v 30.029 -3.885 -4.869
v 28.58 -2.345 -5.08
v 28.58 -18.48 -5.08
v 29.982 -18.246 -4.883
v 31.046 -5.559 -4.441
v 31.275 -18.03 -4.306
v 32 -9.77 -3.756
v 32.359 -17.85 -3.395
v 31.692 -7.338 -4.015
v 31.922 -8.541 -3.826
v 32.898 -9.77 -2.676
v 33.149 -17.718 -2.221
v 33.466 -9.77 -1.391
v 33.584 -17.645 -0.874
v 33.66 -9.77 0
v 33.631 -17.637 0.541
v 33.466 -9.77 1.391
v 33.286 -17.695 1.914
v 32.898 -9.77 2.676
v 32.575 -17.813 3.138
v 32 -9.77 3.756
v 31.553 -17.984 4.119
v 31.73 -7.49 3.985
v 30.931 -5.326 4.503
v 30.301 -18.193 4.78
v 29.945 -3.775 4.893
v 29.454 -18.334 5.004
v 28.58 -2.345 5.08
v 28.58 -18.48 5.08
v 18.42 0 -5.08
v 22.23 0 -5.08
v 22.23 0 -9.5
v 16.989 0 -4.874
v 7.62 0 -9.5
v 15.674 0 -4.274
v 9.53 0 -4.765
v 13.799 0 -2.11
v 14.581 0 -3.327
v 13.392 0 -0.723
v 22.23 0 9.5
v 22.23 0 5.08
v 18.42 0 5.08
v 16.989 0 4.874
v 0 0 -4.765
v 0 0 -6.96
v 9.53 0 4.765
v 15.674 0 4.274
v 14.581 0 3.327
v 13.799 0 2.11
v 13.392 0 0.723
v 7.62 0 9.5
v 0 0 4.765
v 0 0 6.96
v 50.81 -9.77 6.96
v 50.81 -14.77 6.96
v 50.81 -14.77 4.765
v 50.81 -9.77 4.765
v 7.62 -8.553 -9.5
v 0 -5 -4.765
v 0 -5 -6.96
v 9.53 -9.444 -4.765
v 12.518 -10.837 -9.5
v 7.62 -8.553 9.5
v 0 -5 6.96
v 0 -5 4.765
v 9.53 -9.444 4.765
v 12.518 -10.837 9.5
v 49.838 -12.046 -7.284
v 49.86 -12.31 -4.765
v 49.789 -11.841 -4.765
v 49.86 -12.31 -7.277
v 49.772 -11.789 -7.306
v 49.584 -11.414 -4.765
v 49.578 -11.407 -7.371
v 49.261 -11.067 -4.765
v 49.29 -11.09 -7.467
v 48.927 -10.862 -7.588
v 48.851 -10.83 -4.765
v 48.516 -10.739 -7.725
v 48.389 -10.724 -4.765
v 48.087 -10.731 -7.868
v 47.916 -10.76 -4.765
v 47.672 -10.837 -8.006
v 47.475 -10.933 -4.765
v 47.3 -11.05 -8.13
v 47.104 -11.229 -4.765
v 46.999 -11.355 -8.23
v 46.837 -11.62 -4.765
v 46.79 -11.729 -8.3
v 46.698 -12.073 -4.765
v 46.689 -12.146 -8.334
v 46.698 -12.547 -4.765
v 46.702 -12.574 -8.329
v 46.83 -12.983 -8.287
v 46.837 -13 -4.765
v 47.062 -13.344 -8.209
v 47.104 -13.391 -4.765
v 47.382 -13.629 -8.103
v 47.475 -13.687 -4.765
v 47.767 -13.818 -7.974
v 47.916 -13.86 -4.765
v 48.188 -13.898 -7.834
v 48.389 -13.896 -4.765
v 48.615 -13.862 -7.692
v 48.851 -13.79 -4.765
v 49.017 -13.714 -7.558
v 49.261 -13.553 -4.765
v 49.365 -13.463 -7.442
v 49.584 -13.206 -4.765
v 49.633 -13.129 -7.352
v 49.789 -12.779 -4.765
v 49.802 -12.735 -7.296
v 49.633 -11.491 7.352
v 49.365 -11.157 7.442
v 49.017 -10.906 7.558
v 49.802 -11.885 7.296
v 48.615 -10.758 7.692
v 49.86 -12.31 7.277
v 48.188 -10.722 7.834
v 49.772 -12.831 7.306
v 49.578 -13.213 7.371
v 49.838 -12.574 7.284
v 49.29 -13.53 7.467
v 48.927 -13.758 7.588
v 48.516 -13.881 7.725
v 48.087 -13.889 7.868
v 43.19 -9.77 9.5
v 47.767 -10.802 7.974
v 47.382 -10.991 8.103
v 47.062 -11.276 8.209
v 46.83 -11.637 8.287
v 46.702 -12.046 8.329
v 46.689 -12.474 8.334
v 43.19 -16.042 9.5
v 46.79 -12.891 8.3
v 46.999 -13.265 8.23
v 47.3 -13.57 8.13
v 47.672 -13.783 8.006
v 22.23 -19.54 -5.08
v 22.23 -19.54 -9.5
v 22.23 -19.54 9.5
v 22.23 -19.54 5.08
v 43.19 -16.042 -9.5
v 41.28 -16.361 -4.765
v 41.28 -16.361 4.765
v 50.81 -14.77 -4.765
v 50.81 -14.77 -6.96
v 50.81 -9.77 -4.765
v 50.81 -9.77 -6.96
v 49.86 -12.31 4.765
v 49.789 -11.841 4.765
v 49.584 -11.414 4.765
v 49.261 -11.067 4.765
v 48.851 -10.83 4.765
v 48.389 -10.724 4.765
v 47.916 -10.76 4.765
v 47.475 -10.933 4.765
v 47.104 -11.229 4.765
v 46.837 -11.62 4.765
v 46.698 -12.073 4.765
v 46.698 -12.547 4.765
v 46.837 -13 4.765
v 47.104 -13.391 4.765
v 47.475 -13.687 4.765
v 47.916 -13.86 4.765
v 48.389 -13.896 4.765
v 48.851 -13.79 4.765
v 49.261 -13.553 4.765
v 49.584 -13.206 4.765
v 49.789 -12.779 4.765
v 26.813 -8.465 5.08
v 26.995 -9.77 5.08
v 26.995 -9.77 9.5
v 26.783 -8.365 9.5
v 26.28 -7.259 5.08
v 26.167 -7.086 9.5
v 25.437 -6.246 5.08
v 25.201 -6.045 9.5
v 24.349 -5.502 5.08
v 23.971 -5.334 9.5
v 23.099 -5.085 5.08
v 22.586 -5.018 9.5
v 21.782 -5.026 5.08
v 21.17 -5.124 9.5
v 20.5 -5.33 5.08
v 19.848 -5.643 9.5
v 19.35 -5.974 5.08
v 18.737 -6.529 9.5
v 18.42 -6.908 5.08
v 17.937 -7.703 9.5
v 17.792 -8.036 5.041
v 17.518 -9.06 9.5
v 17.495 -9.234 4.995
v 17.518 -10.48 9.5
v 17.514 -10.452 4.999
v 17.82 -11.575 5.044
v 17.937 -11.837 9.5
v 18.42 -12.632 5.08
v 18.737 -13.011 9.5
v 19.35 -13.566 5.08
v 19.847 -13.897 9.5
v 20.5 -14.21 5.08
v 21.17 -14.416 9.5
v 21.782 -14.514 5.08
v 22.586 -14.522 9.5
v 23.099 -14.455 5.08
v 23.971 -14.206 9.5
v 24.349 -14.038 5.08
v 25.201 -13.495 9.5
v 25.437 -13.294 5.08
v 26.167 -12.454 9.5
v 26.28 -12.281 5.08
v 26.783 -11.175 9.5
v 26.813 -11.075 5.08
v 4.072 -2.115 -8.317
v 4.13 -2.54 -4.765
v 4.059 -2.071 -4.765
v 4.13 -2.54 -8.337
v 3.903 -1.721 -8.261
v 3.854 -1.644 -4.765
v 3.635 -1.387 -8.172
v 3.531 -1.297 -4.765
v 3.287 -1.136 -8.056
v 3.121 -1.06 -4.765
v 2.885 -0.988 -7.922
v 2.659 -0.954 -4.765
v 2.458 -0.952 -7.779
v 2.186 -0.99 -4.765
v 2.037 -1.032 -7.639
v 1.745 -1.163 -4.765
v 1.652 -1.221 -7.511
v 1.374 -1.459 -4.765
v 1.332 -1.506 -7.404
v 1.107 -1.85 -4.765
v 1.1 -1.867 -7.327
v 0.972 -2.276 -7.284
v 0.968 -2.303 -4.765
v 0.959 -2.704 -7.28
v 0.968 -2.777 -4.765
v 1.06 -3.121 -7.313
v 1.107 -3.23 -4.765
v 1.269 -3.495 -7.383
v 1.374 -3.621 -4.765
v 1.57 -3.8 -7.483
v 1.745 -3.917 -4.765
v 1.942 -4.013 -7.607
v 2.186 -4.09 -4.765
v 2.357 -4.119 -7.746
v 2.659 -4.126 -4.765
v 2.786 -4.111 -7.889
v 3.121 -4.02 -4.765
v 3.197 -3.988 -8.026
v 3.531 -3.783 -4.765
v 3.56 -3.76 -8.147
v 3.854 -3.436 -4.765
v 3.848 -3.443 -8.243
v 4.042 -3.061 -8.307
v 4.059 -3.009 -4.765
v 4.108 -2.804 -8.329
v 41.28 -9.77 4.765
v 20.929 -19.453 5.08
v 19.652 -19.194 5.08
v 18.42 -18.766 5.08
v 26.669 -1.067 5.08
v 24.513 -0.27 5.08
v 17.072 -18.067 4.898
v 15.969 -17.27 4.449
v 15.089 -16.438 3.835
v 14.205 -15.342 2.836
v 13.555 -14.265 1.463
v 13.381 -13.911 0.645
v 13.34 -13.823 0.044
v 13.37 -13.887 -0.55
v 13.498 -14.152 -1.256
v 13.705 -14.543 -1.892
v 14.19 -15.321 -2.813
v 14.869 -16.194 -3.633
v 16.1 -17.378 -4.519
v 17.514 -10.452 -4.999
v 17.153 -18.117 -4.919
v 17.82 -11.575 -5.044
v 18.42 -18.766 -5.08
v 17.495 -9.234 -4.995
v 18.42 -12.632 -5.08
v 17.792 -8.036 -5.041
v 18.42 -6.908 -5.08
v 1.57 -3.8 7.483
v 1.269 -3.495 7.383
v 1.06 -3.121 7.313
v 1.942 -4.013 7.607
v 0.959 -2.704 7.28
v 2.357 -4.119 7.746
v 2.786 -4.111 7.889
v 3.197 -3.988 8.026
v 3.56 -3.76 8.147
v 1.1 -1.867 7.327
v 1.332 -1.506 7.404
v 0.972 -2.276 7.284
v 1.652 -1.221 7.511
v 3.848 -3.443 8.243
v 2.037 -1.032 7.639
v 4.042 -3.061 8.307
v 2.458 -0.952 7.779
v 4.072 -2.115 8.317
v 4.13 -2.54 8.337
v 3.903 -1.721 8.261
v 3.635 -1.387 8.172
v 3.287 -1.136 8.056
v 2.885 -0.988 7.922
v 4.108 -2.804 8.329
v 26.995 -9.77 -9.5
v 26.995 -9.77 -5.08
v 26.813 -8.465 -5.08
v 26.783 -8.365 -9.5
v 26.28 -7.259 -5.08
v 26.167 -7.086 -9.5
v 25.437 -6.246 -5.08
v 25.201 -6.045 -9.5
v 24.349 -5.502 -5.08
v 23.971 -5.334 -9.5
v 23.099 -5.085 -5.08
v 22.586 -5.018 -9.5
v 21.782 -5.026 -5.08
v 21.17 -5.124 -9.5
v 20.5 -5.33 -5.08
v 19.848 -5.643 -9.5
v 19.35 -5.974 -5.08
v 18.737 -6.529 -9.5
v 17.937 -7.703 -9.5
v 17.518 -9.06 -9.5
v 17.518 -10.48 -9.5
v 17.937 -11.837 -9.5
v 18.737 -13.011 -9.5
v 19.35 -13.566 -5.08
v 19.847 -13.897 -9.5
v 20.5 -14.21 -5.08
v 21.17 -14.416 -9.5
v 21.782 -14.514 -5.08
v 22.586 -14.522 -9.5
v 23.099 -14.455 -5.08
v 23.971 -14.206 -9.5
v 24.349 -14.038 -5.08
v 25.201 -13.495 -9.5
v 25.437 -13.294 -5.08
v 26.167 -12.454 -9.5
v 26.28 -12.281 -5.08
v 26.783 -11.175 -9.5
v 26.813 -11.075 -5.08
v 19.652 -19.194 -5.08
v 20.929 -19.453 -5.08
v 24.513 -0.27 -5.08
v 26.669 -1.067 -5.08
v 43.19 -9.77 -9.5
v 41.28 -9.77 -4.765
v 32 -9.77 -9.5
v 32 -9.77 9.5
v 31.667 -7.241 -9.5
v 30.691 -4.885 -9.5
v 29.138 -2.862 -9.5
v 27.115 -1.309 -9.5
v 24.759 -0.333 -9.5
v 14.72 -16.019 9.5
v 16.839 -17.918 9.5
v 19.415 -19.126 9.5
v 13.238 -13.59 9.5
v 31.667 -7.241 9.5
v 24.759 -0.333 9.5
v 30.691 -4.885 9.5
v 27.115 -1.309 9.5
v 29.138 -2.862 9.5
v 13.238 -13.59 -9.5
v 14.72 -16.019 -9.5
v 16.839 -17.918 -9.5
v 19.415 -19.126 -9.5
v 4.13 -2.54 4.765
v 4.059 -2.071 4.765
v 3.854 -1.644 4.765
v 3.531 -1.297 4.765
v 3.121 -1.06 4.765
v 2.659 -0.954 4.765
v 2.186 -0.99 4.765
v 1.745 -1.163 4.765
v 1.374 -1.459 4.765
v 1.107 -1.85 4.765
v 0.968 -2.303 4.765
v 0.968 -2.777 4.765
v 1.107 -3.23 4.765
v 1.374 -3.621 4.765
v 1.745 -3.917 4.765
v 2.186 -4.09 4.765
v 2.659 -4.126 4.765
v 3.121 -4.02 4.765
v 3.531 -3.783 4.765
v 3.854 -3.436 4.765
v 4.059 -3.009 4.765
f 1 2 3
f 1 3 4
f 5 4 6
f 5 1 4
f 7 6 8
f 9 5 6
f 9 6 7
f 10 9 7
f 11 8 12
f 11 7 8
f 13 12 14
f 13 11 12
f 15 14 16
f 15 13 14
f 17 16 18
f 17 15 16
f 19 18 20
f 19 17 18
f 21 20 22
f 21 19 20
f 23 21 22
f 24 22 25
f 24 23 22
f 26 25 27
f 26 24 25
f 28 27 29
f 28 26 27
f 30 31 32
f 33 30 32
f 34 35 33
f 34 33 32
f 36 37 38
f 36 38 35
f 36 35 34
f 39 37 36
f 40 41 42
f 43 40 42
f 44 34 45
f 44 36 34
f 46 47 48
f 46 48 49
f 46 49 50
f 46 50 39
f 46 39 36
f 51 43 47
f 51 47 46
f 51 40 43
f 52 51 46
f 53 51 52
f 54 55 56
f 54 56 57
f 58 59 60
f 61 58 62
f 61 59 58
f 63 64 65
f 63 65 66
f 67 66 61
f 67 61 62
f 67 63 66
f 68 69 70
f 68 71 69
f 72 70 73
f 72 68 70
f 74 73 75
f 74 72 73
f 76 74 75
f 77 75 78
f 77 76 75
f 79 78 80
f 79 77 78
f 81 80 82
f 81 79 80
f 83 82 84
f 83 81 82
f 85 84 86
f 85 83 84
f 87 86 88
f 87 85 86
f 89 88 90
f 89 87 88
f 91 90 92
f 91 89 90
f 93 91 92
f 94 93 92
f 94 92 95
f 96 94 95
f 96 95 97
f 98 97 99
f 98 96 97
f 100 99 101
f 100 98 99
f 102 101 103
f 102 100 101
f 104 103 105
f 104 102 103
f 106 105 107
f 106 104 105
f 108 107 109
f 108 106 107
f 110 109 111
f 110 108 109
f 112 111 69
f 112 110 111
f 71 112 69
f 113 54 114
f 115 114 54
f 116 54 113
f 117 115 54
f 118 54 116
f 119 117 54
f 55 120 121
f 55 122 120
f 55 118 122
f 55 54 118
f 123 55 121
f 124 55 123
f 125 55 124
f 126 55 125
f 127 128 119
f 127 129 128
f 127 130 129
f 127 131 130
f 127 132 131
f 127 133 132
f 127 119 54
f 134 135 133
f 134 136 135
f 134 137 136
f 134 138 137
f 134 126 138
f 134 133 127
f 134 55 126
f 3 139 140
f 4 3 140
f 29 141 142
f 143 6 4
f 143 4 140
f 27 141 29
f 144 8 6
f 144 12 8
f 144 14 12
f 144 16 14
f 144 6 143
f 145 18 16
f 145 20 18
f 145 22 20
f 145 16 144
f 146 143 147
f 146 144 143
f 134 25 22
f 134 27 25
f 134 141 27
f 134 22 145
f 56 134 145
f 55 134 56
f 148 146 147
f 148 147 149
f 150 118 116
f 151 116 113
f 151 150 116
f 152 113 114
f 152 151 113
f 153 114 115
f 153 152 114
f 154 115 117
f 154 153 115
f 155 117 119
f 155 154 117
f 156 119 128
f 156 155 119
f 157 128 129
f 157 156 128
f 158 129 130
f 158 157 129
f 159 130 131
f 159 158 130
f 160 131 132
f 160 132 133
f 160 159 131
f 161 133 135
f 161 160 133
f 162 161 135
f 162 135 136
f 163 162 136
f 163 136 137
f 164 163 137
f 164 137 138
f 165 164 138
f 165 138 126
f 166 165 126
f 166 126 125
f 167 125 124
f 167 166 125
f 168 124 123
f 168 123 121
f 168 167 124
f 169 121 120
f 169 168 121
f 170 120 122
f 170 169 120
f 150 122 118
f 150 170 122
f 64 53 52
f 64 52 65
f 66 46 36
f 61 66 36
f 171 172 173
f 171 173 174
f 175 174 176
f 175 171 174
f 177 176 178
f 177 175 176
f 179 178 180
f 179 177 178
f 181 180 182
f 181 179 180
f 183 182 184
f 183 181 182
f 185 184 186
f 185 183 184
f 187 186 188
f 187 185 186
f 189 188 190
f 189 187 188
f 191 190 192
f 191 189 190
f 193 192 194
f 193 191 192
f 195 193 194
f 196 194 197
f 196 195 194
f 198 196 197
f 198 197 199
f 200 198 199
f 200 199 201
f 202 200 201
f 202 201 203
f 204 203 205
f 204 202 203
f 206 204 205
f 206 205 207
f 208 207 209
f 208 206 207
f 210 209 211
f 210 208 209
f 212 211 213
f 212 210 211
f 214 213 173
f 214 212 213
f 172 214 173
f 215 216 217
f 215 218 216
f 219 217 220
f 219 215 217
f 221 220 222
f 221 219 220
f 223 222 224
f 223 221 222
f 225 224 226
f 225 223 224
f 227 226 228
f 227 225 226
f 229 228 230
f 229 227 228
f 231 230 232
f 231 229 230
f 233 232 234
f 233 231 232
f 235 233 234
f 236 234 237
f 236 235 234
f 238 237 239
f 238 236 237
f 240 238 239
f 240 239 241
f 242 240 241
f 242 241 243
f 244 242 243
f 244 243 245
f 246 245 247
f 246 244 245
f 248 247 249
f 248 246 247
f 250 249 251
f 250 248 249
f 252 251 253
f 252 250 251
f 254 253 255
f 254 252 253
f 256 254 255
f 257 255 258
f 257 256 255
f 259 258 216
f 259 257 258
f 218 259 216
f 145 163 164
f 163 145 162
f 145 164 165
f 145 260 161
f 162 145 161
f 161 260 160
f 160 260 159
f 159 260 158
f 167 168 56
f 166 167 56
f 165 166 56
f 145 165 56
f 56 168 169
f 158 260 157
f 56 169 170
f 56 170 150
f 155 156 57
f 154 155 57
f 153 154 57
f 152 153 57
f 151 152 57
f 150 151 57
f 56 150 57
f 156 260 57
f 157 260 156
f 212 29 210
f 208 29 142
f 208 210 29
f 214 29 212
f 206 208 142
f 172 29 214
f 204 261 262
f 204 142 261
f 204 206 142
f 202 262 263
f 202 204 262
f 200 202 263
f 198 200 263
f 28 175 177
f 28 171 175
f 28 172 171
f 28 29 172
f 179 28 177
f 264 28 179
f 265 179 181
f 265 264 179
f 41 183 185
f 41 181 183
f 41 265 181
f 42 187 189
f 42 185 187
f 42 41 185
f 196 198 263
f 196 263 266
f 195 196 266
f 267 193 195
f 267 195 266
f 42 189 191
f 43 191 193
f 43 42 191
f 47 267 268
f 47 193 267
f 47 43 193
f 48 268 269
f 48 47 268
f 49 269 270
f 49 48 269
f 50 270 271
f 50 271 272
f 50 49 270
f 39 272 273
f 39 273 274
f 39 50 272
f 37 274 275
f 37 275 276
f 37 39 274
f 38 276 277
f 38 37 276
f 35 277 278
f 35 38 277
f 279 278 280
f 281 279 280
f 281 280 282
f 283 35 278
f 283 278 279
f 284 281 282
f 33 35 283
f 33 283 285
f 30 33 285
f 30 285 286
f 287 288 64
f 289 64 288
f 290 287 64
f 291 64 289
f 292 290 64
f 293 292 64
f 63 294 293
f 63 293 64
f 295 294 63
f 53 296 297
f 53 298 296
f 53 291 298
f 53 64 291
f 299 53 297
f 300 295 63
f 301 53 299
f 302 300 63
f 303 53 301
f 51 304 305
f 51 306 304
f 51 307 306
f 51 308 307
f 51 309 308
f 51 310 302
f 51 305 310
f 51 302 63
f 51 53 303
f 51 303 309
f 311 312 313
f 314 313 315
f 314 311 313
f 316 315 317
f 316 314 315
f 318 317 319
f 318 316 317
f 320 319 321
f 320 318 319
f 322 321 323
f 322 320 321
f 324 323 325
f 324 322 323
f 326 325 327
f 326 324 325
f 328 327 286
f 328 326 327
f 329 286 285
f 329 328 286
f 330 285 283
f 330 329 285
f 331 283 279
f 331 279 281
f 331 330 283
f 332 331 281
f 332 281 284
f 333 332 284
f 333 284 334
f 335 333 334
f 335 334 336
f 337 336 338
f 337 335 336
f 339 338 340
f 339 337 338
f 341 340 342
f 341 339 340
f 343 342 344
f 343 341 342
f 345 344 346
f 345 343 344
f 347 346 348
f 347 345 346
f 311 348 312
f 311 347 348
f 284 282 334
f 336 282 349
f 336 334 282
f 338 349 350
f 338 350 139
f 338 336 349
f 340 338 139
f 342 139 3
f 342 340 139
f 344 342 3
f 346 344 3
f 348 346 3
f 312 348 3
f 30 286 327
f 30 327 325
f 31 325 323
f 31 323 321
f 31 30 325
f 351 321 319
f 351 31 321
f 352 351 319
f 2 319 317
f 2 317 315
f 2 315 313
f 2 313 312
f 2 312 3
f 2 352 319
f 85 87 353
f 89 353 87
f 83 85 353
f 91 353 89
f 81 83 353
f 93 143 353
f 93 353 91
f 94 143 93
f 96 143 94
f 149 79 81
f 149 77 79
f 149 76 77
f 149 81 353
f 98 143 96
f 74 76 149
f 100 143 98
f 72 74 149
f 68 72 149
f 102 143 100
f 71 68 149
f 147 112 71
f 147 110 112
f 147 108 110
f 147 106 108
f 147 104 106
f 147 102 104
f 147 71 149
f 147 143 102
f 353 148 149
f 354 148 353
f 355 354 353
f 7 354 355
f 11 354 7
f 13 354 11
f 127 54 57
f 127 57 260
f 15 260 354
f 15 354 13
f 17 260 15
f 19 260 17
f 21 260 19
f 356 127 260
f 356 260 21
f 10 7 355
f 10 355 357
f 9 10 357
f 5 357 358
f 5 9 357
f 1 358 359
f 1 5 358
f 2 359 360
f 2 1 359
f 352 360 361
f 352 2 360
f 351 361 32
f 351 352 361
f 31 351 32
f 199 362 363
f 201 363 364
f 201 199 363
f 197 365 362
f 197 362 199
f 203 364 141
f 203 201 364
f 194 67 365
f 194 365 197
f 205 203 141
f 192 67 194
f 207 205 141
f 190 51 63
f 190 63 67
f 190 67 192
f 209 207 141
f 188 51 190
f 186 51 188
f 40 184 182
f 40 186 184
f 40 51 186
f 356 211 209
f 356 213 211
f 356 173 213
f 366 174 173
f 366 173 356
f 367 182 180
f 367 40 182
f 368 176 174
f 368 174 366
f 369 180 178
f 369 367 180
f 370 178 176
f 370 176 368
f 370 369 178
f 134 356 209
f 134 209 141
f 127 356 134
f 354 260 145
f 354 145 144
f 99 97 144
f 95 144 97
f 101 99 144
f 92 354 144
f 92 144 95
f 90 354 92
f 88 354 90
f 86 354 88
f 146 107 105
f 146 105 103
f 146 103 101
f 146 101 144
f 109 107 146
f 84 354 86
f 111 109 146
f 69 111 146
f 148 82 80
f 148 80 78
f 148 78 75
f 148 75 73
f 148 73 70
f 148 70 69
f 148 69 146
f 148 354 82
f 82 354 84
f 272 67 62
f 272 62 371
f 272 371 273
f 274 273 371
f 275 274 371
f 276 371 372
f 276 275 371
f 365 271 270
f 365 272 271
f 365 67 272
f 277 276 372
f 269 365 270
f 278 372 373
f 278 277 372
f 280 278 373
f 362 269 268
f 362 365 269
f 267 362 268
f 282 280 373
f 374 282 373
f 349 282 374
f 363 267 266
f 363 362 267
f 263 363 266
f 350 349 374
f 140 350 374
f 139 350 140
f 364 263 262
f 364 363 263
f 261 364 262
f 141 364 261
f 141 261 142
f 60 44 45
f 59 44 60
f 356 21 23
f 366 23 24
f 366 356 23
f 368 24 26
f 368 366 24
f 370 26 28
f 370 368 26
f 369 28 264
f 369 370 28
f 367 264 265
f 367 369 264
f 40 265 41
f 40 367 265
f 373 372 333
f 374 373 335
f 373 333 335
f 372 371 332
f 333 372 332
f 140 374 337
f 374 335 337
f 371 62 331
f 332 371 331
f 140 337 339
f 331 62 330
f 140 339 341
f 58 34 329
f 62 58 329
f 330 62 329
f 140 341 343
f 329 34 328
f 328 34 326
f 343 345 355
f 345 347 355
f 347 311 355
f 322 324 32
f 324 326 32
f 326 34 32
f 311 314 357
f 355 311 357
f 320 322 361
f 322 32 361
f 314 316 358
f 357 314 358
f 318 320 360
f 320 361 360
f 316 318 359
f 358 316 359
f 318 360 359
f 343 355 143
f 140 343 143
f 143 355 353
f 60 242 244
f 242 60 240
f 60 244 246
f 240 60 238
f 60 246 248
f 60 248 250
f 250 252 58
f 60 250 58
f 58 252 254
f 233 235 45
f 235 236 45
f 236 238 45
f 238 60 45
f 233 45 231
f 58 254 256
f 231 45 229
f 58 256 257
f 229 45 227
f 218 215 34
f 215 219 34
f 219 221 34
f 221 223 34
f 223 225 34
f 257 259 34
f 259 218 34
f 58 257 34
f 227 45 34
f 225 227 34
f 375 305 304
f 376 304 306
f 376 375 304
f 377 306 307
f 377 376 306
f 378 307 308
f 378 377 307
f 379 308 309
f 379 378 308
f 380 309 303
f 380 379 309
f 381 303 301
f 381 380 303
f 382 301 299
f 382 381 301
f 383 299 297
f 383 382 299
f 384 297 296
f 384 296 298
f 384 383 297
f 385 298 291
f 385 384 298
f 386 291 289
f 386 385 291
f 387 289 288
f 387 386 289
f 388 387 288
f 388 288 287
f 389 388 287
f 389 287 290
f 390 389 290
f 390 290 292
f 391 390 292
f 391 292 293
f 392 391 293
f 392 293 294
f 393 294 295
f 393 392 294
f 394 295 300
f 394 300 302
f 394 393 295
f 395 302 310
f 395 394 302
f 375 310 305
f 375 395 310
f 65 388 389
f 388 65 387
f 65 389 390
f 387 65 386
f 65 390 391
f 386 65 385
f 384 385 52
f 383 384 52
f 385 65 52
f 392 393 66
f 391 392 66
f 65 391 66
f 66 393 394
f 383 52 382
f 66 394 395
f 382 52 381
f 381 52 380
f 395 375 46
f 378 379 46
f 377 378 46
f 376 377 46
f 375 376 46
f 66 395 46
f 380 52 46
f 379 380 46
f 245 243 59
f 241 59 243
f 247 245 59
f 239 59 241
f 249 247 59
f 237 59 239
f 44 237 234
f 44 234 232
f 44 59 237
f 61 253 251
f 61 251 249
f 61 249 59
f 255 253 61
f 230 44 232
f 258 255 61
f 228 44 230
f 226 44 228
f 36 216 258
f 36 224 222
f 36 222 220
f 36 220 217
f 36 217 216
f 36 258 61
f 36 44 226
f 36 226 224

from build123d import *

# Parameters (mm, degrees)
SKETCH1_R           = 4.765
SKETCH1_R_2         = 1.59
BOSS_EXTRUDE1_DEPTH = 9.5
CHAMFER1_SIZE       = 2.54
CHAMFER1_SIZE_2     = 7.62
CHAMFER2_SIZE       = 7.62
CHAMFER2_SIZE_2     = 2.54
SKETCH2_W           = 9.53
SKETCH2_H           = 9.53
CUT_EXTRUDE1_DEPTH  = 56.26045331
CUT_EXTRUDE2_DEPTH  = 56.26045331


with BuildPart() as part:
    # Sketch1 → Boss-Extrude1 (new, symmetric)
    with BuildSketch(Plane.XY):
        with BuildLine():
            Line((0, 0), (0, -5))
            Line((0, -5), (12.518490754, -10.837468107))
            ThreePointArc((12.518490754, -10.837468107), (15.709887401, -17.046058803), (22.23, -19.54))
            Line((22.23, -19.54), (50.81, -14.77))
            Line((50.81, -14.77), (50.81, -9.77))
            Line((50.81, -9.77), (32, -9.77))
            ThreePointArc((32, -9.77), (29.138433252, -2.861566748), (22.23, 0))
            Line((22.23, 0), (0, 0))
        make_face()
        with Locations((22.23, -9.77)):
            Circle(SKETCH1_R, mode=Mode.SUBTRACT)
        with Locations((2.54, -2.54)):
            Circle(SKETCH1_R_2, mode=Mode.SUBTRACT)
        with Locations((48.27, -12.31)):
            Circle(SKETCH1_R_2, mode=Mode.SUBTRACT)
    extrude(amount=BOSS_EXTRUDE1_DEPTH, both=True)

    # Chamfer1
    # the kernel refuses this chamfer: 7.62, 2.54 mm, written as the material it takes off along each edge
    with BuildSketch(Plane(origin=(0, 19.774364901, -9.5), x_dir=(-0.10902612017980703, 0, 0.9940388851139267), z_dir=(0, -1, 0))) as chamfer1_piece_1:
        Polygon((CHAMFER1_SIZE * 0.994038885114, -CHAMFER1_SIZE * 0.10902612018), (-CHAMFER1_SIZE_2 * 0.10902612018, -CHAMFER1_SIZE_2 * 0.994038885114), (0, 0), align=None)
    extrude(amount=44.548729802, mode=Mode.SUBTRACT)
    with BuildSketch(Plane(origin=(0, 19.774364901, 9.5), x_dir=(-0.10902612017980703, 0, -0.9940388851139267), z_dir=(0, -1, 0)), Plane(origin=(50.81, -34.544364901, 9.5), x_dir=(0.10902612017980588, 0, -0.9940388851139268), z_dir=(0, 1, 0))) as chamfer1_piece_2:
        Polygon((CHAMFER1_SIZE * 0.994038885114, CHAMFER1_SIZE * 0.10902612018), (-CHAMFER1_SIZE_2 * 0.10902612018, CHAMFER1_SIZE_2 * 0.994038885114), (0, 0), align=None)
    extrude(amount=44.548729802, mode=Mode.SUBTRACT)

    # Chamfer2
    # the kernel refuses this chamfer: 7.62, 2.54 mm, written as the material it takes off along each edge
    with BuildSketch(Plane(origin=(50.81, -34.544364901, -9.5), x_dir=(-0.9999257509361694, 0, -0.01218575458219919), z_dir=(0, 1, 0))) as chamfer2_piece_1:
        Polygon((CHAMFER2_SIZE * 0.999925750936, CHAMFER2_SIZE * 0.0121857545822), (-CHAMFER2_SIZE_2 * 0.0121857545822, CHAMFER2_SIZE_2 * 0.999925750936), (0, 0), align=None)
    extrude(amount=44.548729802, mode=Mode.SUBTRACT)

    # Sketch2 → Cut-Extrude1 (cut, through all)
    with BuildSketch(Plane(origin=(0, 0, 0), x_dir=(1, 0, 0), z_dir=(0, 1, 0))):
        with Locations((4.765, 0)):
            Rectangle(SKETCH2_W, SKETCH2_H)
        with Locations((46.045, 0)):
            Rectangle(SKETCH2_W, SKETCH2_H)
    extrude(amount=-CUT_EXTRUDE1_DEPTH, mode=Mode.SUBTRACT)

    # Sketch3 → Cut-Extrude2 (cut, through all)
    with BuildSketch(Plane(origin=(0, 0, 0), x_dir=(1, 0, 0), z_dir=(0, 1, 0))):
        with BuildLine():
            Line((18.42, 5.08), (28.58, 5.08))
            ThreePointArc((28.58, 5.08), (33.66, 0), (28.58, -5.08))
            Line((28.58, -5.08), (18.42, -5.08))
            ThreePointArc((18.42, -5.08), (13.34, 0), (18.42, 5.08))
        make_face()
    extrude(amount=-CUT_EXTRUDE2_DEPTH, mode=Mode.SUBTRACT)


solid = part.part
